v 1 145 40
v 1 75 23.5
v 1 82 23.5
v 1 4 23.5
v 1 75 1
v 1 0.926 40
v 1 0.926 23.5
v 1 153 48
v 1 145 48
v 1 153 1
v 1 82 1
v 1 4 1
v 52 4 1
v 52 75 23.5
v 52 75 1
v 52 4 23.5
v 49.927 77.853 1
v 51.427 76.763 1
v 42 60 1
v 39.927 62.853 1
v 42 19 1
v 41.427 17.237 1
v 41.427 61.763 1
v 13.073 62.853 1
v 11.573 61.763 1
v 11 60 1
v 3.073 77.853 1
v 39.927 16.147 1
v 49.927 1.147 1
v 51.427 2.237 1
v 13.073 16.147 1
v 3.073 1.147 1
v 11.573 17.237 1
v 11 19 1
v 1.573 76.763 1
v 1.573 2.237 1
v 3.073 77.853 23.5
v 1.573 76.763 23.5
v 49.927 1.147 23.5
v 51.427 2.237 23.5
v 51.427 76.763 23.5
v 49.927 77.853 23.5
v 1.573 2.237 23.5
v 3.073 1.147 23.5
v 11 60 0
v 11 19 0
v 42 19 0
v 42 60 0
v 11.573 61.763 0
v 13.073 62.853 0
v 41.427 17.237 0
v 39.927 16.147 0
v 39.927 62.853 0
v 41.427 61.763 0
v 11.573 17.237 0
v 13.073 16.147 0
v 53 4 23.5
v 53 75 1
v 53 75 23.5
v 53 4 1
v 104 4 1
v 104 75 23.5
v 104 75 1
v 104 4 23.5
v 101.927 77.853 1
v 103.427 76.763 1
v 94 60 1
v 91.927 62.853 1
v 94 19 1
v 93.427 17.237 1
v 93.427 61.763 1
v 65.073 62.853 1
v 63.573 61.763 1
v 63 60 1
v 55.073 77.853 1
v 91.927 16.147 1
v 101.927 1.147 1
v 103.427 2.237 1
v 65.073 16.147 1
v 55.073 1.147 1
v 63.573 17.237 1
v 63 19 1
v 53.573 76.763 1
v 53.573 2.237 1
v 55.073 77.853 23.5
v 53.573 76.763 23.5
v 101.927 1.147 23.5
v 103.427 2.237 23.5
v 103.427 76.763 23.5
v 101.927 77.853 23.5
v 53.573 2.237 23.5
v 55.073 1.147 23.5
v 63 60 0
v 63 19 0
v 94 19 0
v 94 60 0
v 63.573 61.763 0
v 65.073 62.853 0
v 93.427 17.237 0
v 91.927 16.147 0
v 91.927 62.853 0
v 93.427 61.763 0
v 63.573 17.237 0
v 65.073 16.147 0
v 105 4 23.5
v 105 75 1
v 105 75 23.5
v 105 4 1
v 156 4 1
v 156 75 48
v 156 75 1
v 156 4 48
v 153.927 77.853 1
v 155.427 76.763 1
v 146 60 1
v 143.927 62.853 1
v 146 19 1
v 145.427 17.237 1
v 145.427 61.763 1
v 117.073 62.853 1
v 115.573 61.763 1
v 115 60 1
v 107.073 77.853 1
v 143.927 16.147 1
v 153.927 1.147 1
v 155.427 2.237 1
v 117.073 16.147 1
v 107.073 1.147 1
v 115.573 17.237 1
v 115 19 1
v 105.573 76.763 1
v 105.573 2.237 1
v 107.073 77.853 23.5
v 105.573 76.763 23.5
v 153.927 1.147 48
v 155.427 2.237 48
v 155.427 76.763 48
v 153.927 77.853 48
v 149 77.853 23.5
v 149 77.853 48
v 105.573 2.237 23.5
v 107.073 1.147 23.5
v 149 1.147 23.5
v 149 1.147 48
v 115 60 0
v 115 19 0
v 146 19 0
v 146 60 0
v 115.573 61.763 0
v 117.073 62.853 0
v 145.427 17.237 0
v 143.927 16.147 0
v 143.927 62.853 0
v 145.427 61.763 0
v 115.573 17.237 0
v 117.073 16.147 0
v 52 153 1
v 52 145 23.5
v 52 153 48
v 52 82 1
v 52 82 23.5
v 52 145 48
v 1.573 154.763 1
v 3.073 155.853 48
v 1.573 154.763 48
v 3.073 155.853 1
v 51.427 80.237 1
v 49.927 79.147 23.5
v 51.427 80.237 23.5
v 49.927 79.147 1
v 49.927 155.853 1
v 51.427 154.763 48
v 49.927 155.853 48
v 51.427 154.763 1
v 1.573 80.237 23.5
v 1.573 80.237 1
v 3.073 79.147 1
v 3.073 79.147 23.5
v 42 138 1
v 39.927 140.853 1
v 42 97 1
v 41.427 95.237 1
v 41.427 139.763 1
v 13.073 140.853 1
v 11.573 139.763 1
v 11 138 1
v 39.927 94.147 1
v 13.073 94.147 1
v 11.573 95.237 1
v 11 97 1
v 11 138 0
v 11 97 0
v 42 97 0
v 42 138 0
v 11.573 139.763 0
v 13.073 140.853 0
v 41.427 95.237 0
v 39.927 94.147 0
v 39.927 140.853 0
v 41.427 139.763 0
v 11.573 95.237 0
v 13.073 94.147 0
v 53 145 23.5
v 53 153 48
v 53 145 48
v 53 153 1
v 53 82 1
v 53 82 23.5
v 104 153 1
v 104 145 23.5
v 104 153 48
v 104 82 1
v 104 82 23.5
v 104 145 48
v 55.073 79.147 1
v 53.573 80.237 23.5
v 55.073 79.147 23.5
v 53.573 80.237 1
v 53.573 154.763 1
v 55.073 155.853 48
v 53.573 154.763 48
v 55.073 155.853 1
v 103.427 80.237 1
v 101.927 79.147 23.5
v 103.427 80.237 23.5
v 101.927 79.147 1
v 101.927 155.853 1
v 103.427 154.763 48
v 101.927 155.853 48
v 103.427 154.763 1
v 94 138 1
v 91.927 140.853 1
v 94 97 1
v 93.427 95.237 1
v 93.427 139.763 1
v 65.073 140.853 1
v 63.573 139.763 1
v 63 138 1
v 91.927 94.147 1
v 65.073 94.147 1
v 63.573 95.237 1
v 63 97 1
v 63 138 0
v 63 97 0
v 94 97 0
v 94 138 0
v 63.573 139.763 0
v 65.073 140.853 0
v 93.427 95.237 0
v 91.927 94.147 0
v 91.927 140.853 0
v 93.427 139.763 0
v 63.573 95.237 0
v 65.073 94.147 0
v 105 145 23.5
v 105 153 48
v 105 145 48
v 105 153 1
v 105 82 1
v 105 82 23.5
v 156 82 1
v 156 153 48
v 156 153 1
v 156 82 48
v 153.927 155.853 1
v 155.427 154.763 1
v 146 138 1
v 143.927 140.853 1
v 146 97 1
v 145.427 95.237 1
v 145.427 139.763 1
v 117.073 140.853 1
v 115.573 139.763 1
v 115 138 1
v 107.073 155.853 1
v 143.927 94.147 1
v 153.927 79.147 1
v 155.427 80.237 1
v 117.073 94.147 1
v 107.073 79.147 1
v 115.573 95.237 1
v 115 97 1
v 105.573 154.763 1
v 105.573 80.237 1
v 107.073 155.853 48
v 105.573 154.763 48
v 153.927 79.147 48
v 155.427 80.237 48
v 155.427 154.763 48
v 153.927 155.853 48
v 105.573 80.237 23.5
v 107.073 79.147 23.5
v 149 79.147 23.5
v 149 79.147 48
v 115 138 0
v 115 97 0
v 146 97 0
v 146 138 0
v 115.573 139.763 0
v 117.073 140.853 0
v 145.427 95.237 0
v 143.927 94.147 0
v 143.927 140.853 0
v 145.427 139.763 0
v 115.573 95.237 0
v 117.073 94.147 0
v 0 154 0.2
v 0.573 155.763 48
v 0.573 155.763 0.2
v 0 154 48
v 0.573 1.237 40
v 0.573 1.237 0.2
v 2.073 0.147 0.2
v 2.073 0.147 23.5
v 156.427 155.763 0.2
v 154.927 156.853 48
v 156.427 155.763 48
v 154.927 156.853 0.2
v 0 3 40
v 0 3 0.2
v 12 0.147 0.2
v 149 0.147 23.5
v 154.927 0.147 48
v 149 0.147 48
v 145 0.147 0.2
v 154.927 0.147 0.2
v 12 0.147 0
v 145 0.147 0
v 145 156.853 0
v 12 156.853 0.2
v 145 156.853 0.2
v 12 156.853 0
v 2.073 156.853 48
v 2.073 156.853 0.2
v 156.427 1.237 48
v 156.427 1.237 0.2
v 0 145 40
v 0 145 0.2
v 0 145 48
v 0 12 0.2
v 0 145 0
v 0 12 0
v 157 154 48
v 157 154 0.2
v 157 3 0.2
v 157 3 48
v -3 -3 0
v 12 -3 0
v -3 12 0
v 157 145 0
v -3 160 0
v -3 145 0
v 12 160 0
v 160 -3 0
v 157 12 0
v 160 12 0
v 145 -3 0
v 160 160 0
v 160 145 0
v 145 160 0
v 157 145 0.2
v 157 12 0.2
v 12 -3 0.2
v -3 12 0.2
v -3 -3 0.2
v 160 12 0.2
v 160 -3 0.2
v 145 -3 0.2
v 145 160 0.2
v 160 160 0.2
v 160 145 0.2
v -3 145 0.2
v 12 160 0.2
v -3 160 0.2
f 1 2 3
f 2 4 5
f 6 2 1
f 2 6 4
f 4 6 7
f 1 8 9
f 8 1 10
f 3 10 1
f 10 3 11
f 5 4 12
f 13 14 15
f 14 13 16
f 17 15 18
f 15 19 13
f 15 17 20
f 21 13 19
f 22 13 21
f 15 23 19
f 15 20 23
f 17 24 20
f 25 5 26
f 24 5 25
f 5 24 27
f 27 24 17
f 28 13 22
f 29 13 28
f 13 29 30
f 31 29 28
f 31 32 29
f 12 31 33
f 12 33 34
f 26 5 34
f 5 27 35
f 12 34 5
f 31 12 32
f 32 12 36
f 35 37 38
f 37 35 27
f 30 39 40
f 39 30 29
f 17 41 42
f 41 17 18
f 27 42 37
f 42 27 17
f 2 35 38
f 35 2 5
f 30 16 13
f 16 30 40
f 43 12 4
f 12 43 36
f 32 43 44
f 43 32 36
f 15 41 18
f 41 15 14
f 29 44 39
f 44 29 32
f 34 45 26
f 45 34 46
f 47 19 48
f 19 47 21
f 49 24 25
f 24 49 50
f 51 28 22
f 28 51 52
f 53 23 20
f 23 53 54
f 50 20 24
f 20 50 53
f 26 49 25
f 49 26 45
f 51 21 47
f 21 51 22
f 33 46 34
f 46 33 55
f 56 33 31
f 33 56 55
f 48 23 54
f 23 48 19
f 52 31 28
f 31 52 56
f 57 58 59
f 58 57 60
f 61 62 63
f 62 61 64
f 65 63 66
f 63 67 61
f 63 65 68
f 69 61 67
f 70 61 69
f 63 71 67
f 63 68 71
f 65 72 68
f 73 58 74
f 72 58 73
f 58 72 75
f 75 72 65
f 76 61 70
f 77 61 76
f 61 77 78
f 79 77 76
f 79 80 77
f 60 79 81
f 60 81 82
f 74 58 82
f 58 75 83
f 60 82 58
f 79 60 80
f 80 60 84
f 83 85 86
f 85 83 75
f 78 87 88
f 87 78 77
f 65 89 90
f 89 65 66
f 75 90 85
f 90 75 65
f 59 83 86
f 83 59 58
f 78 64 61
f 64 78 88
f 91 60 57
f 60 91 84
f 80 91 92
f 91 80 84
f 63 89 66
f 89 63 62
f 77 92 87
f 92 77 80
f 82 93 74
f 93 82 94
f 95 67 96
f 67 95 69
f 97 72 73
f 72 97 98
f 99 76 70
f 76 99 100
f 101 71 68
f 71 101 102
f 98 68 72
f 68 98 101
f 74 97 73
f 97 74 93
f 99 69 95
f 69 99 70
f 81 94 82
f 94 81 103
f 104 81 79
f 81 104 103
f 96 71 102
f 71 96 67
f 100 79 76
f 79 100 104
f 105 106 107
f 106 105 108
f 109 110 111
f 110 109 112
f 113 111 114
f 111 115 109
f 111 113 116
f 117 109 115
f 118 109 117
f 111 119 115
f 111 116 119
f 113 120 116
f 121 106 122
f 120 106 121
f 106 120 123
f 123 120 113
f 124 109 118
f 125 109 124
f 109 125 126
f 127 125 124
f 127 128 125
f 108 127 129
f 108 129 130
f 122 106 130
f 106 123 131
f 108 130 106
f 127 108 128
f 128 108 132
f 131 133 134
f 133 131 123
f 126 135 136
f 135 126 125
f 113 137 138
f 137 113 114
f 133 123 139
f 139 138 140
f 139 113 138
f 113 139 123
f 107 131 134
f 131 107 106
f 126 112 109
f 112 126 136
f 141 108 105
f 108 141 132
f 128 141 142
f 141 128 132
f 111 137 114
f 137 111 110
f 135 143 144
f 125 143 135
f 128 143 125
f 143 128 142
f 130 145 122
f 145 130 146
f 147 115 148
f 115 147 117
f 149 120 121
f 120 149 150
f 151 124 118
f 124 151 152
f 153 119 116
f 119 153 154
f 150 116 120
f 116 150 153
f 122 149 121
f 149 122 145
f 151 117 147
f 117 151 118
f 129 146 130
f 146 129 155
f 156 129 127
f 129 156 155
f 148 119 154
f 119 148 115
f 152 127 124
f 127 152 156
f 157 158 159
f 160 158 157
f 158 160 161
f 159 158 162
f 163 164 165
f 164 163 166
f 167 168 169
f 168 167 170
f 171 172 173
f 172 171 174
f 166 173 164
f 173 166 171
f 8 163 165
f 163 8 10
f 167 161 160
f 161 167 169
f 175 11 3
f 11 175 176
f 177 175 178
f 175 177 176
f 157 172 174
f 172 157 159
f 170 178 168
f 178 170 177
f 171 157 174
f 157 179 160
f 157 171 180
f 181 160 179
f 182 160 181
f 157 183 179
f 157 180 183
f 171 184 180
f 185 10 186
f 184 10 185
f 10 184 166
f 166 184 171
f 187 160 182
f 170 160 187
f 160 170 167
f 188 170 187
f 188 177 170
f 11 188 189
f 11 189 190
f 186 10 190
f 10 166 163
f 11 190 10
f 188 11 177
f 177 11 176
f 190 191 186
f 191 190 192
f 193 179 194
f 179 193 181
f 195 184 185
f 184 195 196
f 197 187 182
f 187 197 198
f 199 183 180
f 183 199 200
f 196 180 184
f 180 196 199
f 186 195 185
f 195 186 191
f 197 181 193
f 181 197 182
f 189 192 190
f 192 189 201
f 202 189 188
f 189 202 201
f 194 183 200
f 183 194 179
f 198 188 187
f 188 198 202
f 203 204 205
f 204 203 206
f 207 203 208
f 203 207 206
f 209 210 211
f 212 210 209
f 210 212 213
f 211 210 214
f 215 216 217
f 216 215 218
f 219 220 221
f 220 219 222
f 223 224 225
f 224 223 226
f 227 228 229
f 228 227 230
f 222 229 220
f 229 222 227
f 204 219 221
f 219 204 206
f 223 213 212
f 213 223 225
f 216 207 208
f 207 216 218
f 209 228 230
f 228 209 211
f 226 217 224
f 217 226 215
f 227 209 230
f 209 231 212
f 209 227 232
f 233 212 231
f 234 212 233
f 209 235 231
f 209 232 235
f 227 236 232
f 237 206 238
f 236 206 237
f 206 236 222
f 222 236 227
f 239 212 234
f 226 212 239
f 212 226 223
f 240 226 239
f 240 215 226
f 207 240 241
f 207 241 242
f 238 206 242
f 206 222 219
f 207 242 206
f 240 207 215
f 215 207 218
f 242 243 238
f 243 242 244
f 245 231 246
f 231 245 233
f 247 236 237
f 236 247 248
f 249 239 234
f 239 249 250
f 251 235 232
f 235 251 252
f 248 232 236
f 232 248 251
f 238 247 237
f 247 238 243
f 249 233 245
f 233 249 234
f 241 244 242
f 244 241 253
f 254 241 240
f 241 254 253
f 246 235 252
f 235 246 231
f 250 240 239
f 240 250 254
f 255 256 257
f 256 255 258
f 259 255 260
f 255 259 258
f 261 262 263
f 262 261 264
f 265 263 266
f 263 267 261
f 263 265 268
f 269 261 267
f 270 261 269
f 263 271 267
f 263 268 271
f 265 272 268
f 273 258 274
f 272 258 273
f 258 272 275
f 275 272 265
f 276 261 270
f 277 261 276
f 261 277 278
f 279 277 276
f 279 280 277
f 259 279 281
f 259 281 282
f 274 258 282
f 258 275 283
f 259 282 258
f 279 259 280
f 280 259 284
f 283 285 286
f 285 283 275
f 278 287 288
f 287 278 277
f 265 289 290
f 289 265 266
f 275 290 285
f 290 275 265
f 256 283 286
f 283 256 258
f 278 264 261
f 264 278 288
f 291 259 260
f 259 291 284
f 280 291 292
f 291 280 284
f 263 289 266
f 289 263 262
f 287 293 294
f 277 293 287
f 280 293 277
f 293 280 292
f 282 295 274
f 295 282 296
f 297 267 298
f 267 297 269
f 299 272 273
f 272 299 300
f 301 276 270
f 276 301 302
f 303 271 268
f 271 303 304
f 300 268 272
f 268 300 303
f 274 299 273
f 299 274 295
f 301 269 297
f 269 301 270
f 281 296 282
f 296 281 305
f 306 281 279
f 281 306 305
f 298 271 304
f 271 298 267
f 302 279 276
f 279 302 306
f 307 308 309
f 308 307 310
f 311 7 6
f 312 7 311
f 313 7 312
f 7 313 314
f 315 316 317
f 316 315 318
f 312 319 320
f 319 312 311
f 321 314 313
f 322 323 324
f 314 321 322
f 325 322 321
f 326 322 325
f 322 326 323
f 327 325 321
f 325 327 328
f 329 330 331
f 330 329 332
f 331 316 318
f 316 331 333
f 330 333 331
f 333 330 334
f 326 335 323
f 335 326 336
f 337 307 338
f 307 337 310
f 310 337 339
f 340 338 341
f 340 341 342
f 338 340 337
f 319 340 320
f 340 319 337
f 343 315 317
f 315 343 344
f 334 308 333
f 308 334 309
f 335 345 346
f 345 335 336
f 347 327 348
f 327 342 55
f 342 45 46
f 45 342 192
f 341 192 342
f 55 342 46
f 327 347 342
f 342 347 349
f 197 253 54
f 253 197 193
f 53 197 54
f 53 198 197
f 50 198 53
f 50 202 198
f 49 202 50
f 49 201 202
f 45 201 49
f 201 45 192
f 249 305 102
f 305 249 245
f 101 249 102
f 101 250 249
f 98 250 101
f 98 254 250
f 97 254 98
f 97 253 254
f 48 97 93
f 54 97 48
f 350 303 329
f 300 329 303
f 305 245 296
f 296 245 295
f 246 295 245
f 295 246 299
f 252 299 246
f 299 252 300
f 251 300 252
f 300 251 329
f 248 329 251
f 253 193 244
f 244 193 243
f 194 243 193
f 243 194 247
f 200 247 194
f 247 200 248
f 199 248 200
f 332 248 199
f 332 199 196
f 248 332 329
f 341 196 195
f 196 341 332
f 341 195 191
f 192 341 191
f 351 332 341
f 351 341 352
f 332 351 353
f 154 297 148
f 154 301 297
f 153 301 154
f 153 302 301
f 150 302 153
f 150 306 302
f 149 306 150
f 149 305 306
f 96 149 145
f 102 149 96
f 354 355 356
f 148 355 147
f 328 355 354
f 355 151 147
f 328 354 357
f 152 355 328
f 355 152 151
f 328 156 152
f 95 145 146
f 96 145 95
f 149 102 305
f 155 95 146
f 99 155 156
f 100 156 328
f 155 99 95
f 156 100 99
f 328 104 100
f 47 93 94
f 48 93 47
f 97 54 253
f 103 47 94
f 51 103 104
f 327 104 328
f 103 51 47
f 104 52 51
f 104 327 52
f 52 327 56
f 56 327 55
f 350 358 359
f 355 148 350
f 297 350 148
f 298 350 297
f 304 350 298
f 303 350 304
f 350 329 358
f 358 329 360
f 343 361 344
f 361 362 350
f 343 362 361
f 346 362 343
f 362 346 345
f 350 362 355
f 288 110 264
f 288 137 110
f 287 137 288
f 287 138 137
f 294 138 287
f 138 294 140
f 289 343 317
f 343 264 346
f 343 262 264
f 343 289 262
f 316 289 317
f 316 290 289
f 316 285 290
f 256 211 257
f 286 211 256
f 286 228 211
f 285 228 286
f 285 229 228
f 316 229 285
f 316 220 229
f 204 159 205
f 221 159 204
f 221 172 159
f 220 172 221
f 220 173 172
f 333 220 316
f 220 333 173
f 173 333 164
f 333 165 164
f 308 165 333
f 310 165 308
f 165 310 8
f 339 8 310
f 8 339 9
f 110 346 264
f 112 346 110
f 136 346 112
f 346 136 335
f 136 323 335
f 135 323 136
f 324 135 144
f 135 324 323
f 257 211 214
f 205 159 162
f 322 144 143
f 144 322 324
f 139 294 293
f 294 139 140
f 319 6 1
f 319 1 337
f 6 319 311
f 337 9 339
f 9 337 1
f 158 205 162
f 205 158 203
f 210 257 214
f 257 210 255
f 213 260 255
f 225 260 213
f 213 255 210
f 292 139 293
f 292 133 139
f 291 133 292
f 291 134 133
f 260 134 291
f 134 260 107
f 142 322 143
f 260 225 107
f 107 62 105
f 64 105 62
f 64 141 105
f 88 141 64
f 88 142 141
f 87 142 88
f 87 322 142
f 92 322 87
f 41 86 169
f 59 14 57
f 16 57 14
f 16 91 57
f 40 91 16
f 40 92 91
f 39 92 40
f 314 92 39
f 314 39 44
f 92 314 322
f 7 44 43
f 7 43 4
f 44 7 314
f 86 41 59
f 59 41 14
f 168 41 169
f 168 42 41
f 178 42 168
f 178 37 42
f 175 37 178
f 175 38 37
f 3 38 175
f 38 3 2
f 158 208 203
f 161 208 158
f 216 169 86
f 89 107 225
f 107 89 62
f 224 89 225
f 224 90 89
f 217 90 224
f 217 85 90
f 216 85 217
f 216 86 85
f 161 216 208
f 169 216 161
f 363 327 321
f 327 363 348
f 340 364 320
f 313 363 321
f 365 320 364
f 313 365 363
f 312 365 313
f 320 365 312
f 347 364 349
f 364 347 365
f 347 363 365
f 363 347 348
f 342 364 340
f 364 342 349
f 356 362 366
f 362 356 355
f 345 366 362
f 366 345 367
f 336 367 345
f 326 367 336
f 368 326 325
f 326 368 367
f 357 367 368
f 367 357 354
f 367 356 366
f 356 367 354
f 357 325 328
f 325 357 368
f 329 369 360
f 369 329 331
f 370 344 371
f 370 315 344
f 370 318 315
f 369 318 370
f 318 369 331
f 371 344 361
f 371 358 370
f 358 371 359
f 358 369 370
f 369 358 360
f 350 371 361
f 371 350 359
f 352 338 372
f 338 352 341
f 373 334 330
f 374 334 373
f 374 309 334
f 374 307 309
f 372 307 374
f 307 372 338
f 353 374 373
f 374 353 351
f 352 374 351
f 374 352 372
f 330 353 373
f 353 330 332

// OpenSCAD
// Box is 98mm deep, SUSAN is 50mm deep
// Box is about 315mm interior.

// 146x288 - Corp Boards x 8
// Fractured corp is 148x148
// planet boards are 289x289
// moon boards are 153x153

module roundedCube(vec,rad=3) {
    hull() {
        translate([rad,rad,0]) cylinder(r=rad,h=vec.z);
        translate([vec.x-rad,rad,0]) cylinder(r=rad,h=vec.z);
        translate([rad,vec.y-rad,0]) cylinder(r=rad,h=vec.z);
        translate([vec.x-rad,vec.y-rad,0]) cylinder(r=rad,h=vec.z);
    }
}

module well(x,y,z,w,h,rad = 3) {
    translate([x,y,z]) hull() {
        translate([rad,rad,rad]) sphere(r=rad);
        translate([w-rad,rad,rad]) sphere(r=rad);
        translate([rad,h-rad,rad]) sphere(r=rad);
        translate([w-rad,h-rad,rad]) sphere(r=rad);
        translate([rad,rad,99]) sphere(r=rad);
        translate([w-rad,rad,99]) sphere(r=rad);
        translate([rad,h-rad,99]) sphere(r=rad);
        translate([w-rad,h-rad,99]) sphere(r=rad);
    }
}

module brim(flag = true) {
    module edge(x,y,r) {
        translate([x,y,0]) rotate([0,0,r]) translate([-3,-3,0]) {
            cube([15,5,0.2]);
            cube([5,15,0.2]);
        }
    }
    if (flag) {
        edge(0,0,0);
        edge(157,0,90);
        edge(157,157,180);
        edge(0,157,270);
    }
}

module cornerBox1() {
    difference() {
        roundedCube([157,157,48]);
        //translate([1,1,1]) roundedCube([77,h1,99]);
        //translate([79,1,1]) roundedCube([77,h1,99]);
        translate([79,1,1]) roundedCube([77,77,99]);
        for (j=[0:1]) 
            for (i=[0:5])
                translate([3+30*j,i*20+10-j*1.2,3]) 
                    cube([j?43:22,j?13.4:11,99]);
        for (i=[0:5])
            translate([40,i*20+5.5,24]) rotate([0,45,0]) cube([33,4.4,33],true);
        translate([1,1,14]) roundedCube([77,130,99]);
        translate([1,132,1]) roundedCube([38,24,99]);
        translate([40,132,1]) roundedCube([38,24,99]);
        
        for (j=[0:1])
            for (i=[0:2])
                translate([79+26*i,79+39*j,15])
                    roundedCube([25,38,99]);
        //translate([79,79,15]) roundedCube([77,77,99]);
        //translate([79,h1+2,1]) roundedCube([77,h2,99]);
        translate([0,12,40]) cube([149,146,50]);
        translate([1,12,23.5]) cube([148,146,16.5]);
        ///translate([-10,79,10]) roundedCube([88,88,99]);
     }
     brim();
}


module cornerBox2(alternate) {
    difference() {
        roundedCube([157,157,48]);
        for(r=[0:1]) {
            for (c=[0:2]) {
                translate([1+c*52,1+r*78,1])
                    roundedCube([51,77,99]);
                if (alternate)
                    translate([11+c*52,16+r*78,-1])
                        roundedCube([51-20,77-30,2]);
            }
        }
        translate([0,-1,40]) cube([149,146,50]);
        translate([1,-1,23.5]) cube([148,146,16.5]);
        //translate([1.5,1.5,18.5]) roundedCube([154,154,5]);
        //translate([4,4,10]) roundedCube([148,148,8.5]);
     }
    if (!alternate)
    for(r=[0:1]) {
        for (c=[0:2]) {
            translate([11+c*52,11+r*78,1])
            roundedCube([51-20,77-20,4]);
        }
    }
    brim();
}

module cornerBox3() {
    difference() {
        roundedCube([157,157,48]);
        translate([1,1,10]) roundedCube([155,155,40]);
        translate([6,6,-1]) roundedCube([145,145,40]);
        translate([0,-1,40]) cube([149+7,146,50]);
        translate([1,-1,23.5]) cube([148+7,146,16.5]);
        //translate([1.5,1.5,18.5]) roundedCube([154,154,5]);
        //translate([4,4,10]) roundedCube([148,148,8.5]);
     }
     translate([157-7,79,23.5]) rotate([90,0,0])
        linear_extrude(1) polygon([[6,0],[0,1.6],[0,16.5+8],[6,16.5+8]]);
     translate([79,157-12,23.5]) rotate([90,0,90])
        linear_extrude(1) polygon([[12,0],[0,1.6],[0,16.5+8],[12,16.5+8]]);
     //translate([79,157-12,23.5]) cube([1,12,16.5+8]);
     //translate([157-12,79,23.5]) cube([12,1,16.5+8]);
    brim();
}

module cornerBox4() {
    h1 = 68;
    h2 = 86;
    difference() {
        roundedCube([157,157,48]);
        translate([1,1,1]) roundedCube([77,h1,99]);
        translate([79,1,1]) roundedCube([77,h1,99]);
        translate([1,h1+2,1]) roundedCube([77,h2,99]);
        translate([79,h1+2,1]) roundedCube([77,h2,99]);
        translate([0,12,40]) cube([149,146,50]);
        translate([1,12,23.5]) cube([148,146,16.5]);
        ///translate([-10,79,10]) roundedCube([88,88,99]);
     }
     brim();
}

/*
translate([0,0,0]) cornerBox1();
translate([0,158,0]) cornerBox2();
translate([-1,157,0]) rotate([0,0,180]) cornerBox3();
translate([-1,158*2-1,0]) rotate([0,0,180]) cornerBox4();
*/

cornerBox2(true);
